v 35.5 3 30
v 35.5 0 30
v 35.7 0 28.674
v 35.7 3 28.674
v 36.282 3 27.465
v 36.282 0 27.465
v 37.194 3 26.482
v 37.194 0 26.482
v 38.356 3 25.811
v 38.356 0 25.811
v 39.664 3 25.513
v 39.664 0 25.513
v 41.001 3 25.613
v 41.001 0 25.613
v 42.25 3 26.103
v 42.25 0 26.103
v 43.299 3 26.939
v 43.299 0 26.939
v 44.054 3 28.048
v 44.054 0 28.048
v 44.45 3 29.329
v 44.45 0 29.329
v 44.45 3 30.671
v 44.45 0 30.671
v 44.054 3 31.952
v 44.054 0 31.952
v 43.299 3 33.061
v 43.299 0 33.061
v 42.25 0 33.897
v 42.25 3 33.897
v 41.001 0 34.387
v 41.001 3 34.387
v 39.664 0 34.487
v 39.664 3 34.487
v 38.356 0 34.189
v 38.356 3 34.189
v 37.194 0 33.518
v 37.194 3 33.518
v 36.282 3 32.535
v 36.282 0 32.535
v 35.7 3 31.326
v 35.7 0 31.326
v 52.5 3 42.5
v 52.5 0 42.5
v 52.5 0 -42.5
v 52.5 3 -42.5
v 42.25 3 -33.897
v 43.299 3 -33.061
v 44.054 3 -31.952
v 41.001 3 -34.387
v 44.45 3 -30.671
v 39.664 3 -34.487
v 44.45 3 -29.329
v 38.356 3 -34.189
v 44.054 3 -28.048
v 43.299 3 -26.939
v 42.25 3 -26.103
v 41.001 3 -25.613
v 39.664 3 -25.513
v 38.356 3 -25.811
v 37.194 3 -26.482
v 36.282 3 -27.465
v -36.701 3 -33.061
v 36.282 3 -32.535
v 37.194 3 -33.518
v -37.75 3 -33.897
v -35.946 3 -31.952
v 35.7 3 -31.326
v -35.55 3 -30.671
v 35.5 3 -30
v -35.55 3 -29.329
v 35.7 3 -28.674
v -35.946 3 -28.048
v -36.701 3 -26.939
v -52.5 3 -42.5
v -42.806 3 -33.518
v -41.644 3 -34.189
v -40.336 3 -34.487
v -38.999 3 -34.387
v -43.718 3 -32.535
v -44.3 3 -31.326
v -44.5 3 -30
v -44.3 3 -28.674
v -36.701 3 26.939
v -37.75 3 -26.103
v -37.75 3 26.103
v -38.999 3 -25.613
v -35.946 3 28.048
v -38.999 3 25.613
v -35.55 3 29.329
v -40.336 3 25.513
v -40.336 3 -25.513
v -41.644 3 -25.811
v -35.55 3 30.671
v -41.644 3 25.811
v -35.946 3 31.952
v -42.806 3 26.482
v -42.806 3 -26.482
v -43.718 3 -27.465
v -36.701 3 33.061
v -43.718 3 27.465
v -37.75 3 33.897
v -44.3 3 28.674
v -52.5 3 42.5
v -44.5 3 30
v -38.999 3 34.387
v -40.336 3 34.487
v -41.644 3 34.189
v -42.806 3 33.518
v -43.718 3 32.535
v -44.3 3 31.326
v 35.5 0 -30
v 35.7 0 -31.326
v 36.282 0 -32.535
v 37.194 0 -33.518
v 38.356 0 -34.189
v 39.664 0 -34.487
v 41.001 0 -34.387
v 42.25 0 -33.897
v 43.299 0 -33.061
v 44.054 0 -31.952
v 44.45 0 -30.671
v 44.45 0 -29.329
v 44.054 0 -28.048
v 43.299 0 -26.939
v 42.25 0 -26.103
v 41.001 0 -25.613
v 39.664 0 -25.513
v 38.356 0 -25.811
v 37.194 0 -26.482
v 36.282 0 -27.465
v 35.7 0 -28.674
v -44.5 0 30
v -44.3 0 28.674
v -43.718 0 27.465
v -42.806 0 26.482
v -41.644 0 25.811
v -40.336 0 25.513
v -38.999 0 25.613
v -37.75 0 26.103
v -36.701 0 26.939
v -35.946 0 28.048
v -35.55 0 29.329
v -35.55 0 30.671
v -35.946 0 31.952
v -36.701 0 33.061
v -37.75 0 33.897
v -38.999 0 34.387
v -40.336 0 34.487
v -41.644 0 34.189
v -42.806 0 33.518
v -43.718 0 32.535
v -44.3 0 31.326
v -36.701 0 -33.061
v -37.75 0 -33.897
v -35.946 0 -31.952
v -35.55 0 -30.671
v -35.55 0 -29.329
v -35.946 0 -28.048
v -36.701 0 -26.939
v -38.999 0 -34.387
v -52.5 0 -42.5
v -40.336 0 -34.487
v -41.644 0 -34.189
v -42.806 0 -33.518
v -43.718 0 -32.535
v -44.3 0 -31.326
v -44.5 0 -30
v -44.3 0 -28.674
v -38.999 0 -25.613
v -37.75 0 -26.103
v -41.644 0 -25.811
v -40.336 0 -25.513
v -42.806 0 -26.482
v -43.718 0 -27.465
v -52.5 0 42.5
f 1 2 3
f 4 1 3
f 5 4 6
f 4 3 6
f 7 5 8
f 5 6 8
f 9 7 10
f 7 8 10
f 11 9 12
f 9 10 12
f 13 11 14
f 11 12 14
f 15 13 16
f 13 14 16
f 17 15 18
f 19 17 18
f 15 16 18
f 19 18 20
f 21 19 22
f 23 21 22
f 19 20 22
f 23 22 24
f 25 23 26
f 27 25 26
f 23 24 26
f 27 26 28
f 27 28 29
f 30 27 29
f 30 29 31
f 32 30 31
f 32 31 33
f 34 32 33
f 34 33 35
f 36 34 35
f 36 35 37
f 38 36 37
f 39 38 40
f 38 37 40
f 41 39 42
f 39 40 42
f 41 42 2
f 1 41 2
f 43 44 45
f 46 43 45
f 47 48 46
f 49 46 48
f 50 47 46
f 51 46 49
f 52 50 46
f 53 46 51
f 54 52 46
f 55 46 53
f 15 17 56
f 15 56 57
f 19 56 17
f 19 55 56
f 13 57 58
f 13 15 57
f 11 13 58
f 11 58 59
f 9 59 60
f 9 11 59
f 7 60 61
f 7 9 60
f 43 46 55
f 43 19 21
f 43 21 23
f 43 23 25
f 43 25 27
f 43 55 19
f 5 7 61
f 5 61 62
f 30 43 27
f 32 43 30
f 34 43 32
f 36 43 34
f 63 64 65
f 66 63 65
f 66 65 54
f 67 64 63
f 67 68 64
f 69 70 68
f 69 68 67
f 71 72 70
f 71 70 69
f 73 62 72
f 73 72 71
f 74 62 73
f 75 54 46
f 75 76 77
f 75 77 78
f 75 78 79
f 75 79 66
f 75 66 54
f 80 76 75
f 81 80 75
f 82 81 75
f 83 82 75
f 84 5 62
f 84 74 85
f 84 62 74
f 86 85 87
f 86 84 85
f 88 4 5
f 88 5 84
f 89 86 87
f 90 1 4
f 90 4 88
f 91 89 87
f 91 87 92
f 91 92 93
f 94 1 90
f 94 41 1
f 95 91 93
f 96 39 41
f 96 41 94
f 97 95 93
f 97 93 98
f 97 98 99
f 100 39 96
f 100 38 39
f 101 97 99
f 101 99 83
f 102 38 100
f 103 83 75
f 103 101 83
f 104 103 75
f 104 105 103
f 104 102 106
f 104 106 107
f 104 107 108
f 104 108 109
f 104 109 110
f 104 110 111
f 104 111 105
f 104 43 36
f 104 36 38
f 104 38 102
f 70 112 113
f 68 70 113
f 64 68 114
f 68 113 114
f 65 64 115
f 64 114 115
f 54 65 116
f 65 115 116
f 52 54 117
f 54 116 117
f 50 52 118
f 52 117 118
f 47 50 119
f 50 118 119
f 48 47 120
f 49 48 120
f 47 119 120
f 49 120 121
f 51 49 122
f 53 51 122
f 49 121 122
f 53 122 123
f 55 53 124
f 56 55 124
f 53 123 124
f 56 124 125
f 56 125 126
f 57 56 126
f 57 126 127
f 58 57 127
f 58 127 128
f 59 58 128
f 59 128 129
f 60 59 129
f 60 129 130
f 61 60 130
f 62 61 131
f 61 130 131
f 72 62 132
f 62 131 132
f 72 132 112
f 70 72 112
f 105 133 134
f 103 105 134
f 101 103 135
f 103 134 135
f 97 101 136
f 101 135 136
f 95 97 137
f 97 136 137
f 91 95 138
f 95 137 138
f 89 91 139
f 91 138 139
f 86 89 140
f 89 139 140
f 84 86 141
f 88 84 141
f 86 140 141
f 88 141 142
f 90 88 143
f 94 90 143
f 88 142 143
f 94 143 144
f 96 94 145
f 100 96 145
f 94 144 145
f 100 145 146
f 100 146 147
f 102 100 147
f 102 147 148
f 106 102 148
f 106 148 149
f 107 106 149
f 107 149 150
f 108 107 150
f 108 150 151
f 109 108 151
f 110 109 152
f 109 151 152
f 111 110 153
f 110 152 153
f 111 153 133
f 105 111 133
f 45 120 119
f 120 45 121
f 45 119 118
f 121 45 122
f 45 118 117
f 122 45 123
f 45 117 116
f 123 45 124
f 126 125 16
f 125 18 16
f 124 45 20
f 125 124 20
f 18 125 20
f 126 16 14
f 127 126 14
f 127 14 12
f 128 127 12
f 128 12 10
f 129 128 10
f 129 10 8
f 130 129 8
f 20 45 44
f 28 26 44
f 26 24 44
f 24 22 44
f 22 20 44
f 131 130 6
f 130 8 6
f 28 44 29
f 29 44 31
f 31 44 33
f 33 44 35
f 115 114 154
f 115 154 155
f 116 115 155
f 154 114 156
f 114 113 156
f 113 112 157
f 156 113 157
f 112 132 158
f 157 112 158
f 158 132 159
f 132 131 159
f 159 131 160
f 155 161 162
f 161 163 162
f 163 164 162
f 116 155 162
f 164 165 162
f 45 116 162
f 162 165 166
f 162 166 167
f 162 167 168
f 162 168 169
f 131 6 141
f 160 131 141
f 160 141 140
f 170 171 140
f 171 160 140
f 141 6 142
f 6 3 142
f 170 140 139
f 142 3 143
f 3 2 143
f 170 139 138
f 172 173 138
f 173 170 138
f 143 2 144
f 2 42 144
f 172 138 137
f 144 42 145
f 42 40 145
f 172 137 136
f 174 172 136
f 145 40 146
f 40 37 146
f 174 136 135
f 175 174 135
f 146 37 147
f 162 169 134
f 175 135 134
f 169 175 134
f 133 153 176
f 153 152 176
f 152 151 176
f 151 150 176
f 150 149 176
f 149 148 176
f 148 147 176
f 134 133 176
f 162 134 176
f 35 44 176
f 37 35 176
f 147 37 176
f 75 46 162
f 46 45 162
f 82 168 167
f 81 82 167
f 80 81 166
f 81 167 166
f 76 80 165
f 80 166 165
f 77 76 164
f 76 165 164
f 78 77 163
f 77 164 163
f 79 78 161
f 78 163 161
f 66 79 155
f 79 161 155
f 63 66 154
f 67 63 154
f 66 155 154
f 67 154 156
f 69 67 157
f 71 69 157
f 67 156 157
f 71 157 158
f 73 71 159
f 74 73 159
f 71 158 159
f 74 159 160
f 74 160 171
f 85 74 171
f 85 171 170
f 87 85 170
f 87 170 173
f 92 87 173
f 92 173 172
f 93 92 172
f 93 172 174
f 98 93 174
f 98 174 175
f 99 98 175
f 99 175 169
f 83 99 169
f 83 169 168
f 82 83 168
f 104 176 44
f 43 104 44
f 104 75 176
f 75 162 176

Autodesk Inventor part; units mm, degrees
ref_plane "YZ Plane" through (0, 0, 0) normal (1, 0, 0) x (0, 1, 0)
ref_plane "XZ Plane" through (0, 0, 0) normal (0, 1, 0) x (-1, 0, 0)
ref_plane "XY Plane" through (0, 0, 0) normal (0, 0, 1) x (1, 0, 0)
sketch "Boceto1" plane through (0, 0, 0) normal (0, 1, 0) x (-1, 0, 0)
  line L0 (52.5, 42.5) -> (-52.5, 42.5)
  line L1 (-52.5, 42.5) -> (-52.5, -42.5)
  line L2 (-52.5, -42.5) -> (52.5, -42.5)
  line L3 (52.5, -42.5) -> (52.5, 42.5)
  line L4 (40, 30) -> (-40, 30)
  line L5 (-40, 30) -> (-40, -30)
  line L6 (-40, -30) -> (40, -30)
  line L7 (40, -30) -> (40, 30)
  line L8 (0, -30) -> (0, -42.5)
  line L9 (52.5, 0) -> (40, 0)
  line L10 (40, 0) -> (0, 0) construction
  line L11 (0, -30) -> (0, 0) construction
  circle A0 centre (40, 30) radius 4.5
  circle A1 centre (40, -30) radius 4.5
  circle A2 centre (-40, -30) radius 4.5
  circle A3 centre (-40, 30) radius 4.5
  dimension "d0" = 105
  dimension "d1" = 85
  dimension "d4" = 80
  dimension "d5" = 60
  dimension "d6" = 9
  dimension "d7" = 9
  dimension "d8" = 9
  dimension "d9" = 9
extrude "Extrusión1" add sketch "Boceto1" along normal blind 3 contours L3 L9 L7 A0 L4 A3 L5 A2 L6 L8 L2 L1 L0 | L3 L2 L8 L6 A1 L7 L9 | L7 A1 L6 A2 L5 A3 L4 A0
properties part number "Placa_Rueda_105x85_80x60_3"
